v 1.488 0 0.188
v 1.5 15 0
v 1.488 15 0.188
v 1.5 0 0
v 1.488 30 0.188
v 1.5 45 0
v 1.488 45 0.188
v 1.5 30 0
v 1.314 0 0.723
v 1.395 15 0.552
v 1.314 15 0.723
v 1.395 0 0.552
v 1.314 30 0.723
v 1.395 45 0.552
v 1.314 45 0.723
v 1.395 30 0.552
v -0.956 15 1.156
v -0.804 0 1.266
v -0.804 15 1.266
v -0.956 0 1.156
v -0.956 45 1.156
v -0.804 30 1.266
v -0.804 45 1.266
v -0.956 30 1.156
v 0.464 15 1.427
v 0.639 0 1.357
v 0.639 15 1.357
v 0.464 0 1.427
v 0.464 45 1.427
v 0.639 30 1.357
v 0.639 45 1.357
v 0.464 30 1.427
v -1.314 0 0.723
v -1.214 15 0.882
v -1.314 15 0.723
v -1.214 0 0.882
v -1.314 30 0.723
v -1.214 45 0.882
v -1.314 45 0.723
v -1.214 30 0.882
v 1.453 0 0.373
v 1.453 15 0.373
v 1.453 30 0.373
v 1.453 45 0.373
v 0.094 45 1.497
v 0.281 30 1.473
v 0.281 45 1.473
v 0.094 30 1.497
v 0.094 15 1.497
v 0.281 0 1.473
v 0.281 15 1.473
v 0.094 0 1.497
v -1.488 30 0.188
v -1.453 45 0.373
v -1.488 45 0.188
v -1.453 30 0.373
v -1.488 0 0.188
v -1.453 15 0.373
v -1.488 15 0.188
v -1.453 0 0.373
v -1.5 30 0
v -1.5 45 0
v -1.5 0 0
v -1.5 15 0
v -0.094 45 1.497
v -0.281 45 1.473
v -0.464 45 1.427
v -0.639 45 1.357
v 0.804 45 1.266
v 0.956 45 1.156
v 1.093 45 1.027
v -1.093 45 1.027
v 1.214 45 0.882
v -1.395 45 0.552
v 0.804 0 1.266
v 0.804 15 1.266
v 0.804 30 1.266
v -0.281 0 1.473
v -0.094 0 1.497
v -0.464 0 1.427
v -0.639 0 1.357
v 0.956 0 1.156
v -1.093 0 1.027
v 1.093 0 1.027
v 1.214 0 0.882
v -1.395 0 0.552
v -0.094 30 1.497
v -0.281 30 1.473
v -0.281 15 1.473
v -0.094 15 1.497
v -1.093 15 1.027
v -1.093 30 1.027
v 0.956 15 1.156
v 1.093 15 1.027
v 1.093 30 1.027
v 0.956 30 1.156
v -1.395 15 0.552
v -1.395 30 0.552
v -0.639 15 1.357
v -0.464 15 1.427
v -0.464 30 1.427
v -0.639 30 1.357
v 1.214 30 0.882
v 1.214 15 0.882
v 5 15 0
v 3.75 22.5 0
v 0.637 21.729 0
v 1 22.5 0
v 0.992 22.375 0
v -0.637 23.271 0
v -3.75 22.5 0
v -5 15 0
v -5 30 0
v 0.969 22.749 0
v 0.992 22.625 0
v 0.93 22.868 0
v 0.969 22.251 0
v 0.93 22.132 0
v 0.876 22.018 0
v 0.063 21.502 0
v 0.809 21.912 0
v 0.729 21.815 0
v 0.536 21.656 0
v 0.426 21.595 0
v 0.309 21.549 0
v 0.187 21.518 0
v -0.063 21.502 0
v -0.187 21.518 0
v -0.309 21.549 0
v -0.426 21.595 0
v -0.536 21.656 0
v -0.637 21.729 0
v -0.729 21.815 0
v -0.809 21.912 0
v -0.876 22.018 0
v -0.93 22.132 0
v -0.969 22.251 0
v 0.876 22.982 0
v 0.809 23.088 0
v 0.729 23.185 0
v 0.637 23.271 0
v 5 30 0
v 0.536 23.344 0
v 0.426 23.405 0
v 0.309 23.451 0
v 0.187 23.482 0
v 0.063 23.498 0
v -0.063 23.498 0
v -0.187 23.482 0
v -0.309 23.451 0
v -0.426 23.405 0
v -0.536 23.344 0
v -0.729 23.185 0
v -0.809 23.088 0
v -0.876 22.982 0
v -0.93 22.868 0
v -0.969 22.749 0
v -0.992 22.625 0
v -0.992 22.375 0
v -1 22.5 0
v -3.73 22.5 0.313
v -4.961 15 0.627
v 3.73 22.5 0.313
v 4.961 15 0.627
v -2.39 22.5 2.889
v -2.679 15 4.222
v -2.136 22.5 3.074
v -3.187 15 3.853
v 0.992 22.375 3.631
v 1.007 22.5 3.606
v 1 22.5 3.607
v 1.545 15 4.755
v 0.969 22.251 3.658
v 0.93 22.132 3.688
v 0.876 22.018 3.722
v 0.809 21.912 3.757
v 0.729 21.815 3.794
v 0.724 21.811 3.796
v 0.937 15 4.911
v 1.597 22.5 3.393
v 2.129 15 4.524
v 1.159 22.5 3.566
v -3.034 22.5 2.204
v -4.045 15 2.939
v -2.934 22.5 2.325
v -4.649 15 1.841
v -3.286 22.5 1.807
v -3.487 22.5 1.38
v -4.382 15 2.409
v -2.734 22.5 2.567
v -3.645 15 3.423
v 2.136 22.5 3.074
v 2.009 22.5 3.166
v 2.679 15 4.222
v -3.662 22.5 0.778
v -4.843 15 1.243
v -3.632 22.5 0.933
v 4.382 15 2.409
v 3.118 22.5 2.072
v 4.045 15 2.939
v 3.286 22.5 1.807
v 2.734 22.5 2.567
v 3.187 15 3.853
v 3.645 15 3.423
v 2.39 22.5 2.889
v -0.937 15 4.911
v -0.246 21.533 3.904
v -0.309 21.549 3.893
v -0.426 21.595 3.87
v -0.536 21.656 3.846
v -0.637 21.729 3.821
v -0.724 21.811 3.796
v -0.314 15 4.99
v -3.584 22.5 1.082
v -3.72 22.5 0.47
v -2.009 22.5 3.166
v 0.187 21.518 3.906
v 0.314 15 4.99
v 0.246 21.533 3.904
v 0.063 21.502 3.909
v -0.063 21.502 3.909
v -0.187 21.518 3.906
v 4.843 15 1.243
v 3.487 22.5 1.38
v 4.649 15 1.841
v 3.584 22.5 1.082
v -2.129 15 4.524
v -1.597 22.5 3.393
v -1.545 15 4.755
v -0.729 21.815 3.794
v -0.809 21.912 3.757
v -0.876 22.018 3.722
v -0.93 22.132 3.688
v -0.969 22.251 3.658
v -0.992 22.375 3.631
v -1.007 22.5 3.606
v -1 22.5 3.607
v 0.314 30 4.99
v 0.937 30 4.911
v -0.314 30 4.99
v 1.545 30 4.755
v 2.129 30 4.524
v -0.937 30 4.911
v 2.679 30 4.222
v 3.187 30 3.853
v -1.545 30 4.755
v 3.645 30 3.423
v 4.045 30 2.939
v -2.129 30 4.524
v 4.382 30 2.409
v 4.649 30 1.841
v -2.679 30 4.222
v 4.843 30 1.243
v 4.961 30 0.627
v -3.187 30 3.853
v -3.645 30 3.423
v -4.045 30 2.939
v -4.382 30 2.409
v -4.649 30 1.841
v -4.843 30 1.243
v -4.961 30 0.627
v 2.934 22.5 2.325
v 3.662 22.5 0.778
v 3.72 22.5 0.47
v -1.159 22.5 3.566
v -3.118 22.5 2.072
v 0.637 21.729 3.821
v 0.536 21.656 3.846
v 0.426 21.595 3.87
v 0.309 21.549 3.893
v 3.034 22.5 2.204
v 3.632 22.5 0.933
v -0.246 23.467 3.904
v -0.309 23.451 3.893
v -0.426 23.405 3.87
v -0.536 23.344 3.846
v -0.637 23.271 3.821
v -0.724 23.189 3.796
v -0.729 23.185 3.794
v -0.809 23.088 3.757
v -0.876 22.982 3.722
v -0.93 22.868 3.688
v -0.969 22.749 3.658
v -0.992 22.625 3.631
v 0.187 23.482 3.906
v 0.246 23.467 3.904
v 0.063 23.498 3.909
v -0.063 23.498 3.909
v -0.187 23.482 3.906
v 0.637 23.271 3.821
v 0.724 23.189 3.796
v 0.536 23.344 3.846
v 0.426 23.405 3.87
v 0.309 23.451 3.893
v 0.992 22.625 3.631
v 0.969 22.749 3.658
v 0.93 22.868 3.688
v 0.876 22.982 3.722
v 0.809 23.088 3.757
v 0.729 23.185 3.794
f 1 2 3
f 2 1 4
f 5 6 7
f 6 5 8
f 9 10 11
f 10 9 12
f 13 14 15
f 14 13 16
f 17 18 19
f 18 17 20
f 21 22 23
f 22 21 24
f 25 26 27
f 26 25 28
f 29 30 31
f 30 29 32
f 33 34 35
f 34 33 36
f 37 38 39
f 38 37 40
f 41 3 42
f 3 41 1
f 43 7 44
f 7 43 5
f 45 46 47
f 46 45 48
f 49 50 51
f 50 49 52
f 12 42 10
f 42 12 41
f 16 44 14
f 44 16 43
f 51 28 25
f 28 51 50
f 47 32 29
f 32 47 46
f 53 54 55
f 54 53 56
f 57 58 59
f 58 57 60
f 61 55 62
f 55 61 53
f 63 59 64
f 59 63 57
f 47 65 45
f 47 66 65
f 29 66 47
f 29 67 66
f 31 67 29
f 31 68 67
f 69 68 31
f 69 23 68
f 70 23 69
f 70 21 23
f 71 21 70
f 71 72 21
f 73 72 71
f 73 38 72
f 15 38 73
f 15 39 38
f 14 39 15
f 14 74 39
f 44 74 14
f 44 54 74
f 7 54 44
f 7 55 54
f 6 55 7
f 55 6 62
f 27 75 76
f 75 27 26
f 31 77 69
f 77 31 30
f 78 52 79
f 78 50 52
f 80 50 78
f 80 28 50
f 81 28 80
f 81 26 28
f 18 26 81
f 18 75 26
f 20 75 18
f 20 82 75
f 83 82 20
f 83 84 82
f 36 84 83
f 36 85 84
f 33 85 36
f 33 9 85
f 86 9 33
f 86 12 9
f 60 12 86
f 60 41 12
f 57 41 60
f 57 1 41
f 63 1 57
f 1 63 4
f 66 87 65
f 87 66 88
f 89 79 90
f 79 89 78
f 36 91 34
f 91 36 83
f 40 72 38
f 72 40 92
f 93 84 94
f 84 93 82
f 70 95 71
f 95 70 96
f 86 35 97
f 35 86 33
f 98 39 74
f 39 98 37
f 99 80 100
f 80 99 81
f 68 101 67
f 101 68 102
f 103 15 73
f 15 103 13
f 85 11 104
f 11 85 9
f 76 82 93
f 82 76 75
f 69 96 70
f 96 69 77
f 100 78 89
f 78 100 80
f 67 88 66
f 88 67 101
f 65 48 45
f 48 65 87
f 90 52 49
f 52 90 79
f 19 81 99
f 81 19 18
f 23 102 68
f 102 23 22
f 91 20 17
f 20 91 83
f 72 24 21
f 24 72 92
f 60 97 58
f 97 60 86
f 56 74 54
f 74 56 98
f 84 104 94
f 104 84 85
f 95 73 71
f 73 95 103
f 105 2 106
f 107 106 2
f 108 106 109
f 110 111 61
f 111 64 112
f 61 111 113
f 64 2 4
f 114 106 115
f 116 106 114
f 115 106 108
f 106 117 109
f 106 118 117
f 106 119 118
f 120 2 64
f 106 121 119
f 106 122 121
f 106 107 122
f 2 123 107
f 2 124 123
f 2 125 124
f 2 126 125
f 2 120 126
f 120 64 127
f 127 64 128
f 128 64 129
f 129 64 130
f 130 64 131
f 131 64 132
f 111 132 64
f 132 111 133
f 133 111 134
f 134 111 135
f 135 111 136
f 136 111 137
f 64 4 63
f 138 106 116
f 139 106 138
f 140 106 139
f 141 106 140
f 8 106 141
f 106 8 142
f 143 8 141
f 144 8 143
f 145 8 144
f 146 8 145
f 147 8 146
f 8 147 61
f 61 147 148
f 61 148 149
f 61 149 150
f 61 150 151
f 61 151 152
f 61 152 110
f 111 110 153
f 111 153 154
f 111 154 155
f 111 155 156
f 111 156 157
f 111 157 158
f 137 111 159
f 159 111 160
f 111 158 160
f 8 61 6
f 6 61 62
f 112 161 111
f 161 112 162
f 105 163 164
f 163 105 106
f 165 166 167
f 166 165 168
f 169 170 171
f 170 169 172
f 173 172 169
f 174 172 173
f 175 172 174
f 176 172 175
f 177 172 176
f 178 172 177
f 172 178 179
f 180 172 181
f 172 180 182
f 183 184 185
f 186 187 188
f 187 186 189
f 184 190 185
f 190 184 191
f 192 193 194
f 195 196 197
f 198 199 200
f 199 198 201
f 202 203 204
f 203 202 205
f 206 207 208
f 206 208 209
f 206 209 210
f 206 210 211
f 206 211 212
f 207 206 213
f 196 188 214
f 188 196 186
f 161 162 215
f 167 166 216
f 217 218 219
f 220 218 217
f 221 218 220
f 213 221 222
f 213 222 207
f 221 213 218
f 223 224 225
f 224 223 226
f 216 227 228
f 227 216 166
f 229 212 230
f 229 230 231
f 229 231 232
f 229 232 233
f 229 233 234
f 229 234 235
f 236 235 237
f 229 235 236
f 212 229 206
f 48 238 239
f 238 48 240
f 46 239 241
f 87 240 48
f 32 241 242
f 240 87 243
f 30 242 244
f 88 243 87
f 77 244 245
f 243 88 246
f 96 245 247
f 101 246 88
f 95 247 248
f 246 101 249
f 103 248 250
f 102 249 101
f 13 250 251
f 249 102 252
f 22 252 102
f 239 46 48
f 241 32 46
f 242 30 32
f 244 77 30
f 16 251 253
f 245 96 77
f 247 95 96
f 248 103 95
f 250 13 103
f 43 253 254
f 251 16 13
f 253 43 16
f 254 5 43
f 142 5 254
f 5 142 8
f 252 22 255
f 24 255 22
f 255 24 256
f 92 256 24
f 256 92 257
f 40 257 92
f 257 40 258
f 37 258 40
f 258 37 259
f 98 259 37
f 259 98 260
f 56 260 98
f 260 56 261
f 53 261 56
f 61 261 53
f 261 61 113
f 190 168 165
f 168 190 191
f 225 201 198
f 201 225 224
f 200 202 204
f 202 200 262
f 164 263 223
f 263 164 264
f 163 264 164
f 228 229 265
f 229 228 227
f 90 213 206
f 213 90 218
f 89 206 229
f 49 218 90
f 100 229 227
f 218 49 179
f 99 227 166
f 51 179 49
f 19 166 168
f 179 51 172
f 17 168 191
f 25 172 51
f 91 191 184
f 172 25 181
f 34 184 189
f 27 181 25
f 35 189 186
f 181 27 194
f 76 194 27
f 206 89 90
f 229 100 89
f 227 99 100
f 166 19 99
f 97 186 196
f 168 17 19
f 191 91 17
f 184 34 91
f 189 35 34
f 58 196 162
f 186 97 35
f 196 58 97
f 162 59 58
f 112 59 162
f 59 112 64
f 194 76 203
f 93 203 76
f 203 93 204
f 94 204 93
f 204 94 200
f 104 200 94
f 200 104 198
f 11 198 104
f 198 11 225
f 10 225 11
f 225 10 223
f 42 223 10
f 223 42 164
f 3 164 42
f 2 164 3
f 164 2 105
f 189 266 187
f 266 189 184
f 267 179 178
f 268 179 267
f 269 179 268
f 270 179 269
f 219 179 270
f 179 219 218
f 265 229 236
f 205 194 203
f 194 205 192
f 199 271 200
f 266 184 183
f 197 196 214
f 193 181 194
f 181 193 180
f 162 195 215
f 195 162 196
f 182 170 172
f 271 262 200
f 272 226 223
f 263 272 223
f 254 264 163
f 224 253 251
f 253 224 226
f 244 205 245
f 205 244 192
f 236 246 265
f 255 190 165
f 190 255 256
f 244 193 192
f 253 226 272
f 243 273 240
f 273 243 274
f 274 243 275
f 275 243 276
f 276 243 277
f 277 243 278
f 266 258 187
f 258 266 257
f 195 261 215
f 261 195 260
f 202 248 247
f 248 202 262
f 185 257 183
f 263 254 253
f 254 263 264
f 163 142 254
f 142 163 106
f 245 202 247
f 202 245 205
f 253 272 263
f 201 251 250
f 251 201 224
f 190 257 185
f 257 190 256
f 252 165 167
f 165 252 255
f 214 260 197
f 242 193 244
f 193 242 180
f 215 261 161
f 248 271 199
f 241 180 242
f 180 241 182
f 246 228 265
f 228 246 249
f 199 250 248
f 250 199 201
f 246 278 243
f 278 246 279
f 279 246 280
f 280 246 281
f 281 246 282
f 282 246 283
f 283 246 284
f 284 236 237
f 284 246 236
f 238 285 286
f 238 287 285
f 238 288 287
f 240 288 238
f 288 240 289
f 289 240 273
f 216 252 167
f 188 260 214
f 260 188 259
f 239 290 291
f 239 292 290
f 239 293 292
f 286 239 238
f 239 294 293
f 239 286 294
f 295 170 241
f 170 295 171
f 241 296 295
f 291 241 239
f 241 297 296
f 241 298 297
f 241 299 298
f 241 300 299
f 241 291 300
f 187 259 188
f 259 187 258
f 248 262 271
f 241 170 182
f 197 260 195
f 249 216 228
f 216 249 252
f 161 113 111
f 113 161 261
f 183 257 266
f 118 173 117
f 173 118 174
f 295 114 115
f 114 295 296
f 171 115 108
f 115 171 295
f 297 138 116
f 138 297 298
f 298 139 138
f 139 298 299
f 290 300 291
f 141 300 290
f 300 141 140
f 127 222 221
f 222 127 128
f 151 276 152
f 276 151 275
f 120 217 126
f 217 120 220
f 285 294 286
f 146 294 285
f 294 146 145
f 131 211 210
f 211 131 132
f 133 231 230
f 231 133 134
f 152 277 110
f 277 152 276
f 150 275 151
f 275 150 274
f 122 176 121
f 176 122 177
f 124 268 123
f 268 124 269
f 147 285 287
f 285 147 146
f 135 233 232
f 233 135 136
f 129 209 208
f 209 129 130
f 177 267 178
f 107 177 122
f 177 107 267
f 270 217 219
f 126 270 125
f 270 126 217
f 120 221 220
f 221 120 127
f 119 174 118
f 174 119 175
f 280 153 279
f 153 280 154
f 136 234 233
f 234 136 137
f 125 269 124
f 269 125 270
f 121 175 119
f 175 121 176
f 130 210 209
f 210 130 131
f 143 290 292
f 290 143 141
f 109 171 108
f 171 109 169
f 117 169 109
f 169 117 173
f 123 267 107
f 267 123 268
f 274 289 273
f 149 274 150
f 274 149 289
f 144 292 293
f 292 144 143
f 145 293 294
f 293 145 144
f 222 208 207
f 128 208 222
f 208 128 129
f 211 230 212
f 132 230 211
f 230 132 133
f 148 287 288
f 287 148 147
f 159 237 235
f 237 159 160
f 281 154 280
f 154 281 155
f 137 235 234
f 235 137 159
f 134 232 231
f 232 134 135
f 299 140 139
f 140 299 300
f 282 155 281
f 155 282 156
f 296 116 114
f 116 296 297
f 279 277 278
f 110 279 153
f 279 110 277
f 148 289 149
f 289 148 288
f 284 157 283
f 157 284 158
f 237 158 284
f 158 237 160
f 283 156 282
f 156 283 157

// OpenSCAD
$fn = 50;

/* Ceiling Loop Spindle (Allow for adjusting height of light hanging models) */

/* [Enable/Disable Loops] */
loop_pos = "c"; // [c:center,l:left,r:right, a:all, s:side only]

/* [Mounting Strip Base]  */
/* Command Strip dimentions is typically 50mmx15mm */
sx = 50 ; // length of mounting strip base
sy = 15 ; // widith of mounting strip base
sh = 2  ; // height of mounting strip base

/* [Loop Sizing] */
lt = 2; // loop thickness
lh = 5; // loop holesize

/* Hook function and module */
function loop_width(thickness, holesize) = holesize+thickness*2;

module handle(x, z, thickness, holesize)
{
    /* Hook centre */
    difference()
    {
        outerdia = (holesize+thickness*2);
        translate([0, 0  , 0])
            rotate([-90,,0])
            cylinder(r=holesize/2, h=sy*3);
        translate([-outerdia/2  , -1/2  , -outerdia/2])
            cube([outerdia,sy*3+1,outerdia/2]);
    }
}

module spindle(x, z, thickness, holesize)
{
    /* Hook centre */
    translate([0, sy  , 0])
    difference()
    {
        rotate([-90,,])
        union()
        {
            cylinder(r1=holesize, r2=holesize/2, h=sy);
            cylinder(r1=holesize/2, r2=holesize, h=sy);
        }
        translate([-holesize*2/2  , -1/2  , -holesize*2/2])
            cube([holesize*2, sy*1+1, holesize*2/2]);
    }
}

difference()
{
  union() {
      handle(sx/2, sh, lt, lh-2);
      spindle(sx/2, sh, lt, lh);
  }
  translate([0, sy*1.5  , 0])cylinder(r=1, h=10);

}
